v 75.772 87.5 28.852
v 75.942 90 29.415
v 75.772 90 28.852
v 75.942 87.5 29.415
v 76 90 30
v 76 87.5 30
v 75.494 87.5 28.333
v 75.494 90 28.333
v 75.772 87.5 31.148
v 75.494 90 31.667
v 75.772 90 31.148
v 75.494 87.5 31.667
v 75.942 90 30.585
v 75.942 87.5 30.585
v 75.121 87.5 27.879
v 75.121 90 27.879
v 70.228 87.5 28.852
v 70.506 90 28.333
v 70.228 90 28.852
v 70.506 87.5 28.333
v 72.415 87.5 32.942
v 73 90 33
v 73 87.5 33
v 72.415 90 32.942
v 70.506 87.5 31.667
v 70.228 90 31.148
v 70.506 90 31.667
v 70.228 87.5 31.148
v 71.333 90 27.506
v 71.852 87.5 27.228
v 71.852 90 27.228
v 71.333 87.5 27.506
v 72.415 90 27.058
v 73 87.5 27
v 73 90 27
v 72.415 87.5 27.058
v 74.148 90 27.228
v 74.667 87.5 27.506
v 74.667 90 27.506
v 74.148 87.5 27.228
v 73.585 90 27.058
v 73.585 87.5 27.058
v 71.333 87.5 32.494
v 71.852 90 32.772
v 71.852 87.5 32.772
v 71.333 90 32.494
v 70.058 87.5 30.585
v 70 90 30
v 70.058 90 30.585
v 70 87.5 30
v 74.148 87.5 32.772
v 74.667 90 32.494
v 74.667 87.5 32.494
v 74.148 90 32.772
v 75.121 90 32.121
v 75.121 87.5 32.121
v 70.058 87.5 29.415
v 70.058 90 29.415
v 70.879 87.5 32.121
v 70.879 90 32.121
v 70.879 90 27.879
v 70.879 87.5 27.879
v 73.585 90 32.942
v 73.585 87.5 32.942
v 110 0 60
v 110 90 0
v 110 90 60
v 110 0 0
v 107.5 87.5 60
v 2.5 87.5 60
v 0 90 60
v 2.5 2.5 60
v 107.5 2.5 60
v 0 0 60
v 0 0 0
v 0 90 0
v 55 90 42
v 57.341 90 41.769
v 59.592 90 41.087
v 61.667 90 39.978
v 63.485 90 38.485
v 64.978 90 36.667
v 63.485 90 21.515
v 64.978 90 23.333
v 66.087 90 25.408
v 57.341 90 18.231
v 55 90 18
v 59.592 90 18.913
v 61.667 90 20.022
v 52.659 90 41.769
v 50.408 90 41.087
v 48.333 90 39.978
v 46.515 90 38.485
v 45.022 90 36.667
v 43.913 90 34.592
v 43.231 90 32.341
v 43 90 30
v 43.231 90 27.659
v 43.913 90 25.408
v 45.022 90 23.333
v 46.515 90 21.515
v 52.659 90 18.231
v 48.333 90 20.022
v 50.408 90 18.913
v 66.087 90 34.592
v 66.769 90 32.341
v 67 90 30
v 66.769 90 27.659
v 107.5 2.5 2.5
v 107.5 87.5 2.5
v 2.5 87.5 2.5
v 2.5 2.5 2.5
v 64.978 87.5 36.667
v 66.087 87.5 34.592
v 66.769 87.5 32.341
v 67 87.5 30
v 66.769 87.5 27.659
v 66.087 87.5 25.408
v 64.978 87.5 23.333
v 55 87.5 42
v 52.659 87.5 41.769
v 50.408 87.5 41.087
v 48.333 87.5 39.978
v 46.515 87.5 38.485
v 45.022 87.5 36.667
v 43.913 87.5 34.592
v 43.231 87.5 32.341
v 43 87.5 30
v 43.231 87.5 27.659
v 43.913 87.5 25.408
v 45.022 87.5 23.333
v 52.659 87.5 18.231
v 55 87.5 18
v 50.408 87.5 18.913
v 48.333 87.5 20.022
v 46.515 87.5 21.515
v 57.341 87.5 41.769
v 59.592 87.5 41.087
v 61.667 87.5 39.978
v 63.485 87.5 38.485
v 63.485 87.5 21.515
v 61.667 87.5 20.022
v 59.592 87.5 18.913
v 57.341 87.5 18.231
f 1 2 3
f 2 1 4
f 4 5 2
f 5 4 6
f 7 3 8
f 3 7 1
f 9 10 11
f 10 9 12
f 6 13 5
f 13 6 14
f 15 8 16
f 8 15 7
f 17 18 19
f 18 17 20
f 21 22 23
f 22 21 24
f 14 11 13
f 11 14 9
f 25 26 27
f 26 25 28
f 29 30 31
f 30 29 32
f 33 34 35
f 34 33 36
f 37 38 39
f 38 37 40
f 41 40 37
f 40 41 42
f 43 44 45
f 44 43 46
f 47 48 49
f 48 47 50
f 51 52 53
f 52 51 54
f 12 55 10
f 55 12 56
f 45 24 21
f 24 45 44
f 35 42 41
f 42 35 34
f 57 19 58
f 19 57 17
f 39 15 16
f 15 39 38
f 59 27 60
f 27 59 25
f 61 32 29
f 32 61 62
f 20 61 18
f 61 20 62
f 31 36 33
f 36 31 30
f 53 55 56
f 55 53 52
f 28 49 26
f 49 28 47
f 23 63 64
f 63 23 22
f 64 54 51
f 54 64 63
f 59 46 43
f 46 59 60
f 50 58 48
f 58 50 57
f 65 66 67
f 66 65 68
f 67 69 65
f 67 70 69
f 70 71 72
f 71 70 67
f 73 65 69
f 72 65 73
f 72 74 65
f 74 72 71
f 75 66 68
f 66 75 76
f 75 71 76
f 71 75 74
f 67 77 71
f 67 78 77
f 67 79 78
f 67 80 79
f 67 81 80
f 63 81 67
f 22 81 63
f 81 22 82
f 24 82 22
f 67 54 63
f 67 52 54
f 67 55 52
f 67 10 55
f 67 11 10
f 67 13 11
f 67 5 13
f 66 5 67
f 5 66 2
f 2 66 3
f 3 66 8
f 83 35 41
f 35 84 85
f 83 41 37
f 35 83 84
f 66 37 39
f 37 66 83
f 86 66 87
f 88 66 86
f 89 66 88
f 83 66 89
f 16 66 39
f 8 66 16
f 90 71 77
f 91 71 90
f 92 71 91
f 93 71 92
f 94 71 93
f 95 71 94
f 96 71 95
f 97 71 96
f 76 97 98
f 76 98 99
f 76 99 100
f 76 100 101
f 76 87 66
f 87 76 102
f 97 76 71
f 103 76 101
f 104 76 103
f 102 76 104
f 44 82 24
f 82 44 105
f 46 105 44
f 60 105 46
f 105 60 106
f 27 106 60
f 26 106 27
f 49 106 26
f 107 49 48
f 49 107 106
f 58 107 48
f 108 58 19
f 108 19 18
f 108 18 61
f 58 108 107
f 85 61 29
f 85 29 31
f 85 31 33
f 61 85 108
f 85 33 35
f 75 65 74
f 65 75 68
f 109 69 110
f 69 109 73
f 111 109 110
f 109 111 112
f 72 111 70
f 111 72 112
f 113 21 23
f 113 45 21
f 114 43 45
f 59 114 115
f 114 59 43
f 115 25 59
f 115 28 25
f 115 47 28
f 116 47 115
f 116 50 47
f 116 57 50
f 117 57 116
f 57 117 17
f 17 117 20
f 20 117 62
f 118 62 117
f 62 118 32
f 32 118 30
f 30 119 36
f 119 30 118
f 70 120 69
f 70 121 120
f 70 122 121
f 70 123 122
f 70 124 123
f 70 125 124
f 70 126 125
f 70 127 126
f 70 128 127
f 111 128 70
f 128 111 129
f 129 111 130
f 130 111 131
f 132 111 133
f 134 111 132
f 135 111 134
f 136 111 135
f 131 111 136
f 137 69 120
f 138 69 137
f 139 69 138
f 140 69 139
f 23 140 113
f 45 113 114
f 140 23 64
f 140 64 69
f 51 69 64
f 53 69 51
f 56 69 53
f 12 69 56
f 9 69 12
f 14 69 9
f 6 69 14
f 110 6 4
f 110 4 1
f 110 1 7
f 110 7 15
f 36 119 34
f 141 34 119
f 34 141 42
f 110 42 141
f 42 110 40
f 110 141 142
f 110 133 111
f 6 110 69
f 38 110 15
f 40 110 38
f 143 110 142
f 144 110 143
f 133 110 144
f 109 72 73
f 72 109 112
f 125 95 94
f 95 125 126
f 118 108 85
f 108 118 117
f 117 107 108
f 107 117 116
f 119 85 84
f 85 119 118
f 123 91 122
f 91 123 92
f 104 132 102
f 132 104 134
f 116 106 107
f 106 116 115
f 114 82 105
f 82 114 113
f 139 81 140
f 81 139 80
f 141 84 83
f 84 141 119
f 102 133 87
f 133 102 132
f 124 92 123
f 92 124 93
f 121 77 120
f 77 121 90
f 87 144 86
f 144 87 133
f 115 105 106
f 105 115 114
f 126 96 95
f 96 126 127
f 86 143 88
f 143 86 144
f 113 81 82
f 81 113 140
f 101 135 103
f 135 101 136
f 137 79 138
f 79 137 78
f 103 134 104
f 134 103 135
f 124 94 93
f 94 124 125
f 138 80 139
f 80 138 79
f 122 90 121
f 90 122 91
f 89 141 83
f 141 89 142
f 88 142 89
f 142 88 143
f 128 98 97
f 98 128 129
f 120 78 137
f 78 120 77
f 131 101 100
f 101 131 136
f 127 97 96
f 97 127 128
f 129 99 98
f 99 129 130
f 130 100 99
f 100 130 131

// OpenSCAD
$fn = 32;

// ----------------------------------------------------------------------
// Vent box: roundvent enclosure
// ----------------------------------------------------------------------

// --- parameters (mm) ---
box_l = 110;              // box length, X
box_w = 90;               // box width, Y
box_h = 60;               // box height, Z
wall_t = 2.5;             // shell wall thickness
vent_d = 24;              // central vent diameter
ring_d = 6;               // ring hole diameter
n_ring = 8;               // holes in the ring
ring_r = 18;              // ring radius

ring_step = 360 / n_ring;  // ring hole angular step

difference() {
  cube([box_l, box_w, box_h]);
  translate([wall_t, wall_t, wall_t])
    cube([box_l - 2 * wall_t, box_w - 2 * wall_t, box_h]);
  translate([box_l / 2, box_w - wall_t - 1, box_h / 2])
    rotate([-90, 0, 0]) cylinder(h = wall_t + 2, d = vent_d);
  for (i = [0 : n_ring - 1])
    translate([box_l / 2, box_w - wall_t - 1, box_h / 2])
      rotate([0, 0, i * ring_step])
        translate([ring_r, 0, 0]) rotate([-90, 0, 0])
          cylinder(h = wall_t + 2, d = ring_d);
}
